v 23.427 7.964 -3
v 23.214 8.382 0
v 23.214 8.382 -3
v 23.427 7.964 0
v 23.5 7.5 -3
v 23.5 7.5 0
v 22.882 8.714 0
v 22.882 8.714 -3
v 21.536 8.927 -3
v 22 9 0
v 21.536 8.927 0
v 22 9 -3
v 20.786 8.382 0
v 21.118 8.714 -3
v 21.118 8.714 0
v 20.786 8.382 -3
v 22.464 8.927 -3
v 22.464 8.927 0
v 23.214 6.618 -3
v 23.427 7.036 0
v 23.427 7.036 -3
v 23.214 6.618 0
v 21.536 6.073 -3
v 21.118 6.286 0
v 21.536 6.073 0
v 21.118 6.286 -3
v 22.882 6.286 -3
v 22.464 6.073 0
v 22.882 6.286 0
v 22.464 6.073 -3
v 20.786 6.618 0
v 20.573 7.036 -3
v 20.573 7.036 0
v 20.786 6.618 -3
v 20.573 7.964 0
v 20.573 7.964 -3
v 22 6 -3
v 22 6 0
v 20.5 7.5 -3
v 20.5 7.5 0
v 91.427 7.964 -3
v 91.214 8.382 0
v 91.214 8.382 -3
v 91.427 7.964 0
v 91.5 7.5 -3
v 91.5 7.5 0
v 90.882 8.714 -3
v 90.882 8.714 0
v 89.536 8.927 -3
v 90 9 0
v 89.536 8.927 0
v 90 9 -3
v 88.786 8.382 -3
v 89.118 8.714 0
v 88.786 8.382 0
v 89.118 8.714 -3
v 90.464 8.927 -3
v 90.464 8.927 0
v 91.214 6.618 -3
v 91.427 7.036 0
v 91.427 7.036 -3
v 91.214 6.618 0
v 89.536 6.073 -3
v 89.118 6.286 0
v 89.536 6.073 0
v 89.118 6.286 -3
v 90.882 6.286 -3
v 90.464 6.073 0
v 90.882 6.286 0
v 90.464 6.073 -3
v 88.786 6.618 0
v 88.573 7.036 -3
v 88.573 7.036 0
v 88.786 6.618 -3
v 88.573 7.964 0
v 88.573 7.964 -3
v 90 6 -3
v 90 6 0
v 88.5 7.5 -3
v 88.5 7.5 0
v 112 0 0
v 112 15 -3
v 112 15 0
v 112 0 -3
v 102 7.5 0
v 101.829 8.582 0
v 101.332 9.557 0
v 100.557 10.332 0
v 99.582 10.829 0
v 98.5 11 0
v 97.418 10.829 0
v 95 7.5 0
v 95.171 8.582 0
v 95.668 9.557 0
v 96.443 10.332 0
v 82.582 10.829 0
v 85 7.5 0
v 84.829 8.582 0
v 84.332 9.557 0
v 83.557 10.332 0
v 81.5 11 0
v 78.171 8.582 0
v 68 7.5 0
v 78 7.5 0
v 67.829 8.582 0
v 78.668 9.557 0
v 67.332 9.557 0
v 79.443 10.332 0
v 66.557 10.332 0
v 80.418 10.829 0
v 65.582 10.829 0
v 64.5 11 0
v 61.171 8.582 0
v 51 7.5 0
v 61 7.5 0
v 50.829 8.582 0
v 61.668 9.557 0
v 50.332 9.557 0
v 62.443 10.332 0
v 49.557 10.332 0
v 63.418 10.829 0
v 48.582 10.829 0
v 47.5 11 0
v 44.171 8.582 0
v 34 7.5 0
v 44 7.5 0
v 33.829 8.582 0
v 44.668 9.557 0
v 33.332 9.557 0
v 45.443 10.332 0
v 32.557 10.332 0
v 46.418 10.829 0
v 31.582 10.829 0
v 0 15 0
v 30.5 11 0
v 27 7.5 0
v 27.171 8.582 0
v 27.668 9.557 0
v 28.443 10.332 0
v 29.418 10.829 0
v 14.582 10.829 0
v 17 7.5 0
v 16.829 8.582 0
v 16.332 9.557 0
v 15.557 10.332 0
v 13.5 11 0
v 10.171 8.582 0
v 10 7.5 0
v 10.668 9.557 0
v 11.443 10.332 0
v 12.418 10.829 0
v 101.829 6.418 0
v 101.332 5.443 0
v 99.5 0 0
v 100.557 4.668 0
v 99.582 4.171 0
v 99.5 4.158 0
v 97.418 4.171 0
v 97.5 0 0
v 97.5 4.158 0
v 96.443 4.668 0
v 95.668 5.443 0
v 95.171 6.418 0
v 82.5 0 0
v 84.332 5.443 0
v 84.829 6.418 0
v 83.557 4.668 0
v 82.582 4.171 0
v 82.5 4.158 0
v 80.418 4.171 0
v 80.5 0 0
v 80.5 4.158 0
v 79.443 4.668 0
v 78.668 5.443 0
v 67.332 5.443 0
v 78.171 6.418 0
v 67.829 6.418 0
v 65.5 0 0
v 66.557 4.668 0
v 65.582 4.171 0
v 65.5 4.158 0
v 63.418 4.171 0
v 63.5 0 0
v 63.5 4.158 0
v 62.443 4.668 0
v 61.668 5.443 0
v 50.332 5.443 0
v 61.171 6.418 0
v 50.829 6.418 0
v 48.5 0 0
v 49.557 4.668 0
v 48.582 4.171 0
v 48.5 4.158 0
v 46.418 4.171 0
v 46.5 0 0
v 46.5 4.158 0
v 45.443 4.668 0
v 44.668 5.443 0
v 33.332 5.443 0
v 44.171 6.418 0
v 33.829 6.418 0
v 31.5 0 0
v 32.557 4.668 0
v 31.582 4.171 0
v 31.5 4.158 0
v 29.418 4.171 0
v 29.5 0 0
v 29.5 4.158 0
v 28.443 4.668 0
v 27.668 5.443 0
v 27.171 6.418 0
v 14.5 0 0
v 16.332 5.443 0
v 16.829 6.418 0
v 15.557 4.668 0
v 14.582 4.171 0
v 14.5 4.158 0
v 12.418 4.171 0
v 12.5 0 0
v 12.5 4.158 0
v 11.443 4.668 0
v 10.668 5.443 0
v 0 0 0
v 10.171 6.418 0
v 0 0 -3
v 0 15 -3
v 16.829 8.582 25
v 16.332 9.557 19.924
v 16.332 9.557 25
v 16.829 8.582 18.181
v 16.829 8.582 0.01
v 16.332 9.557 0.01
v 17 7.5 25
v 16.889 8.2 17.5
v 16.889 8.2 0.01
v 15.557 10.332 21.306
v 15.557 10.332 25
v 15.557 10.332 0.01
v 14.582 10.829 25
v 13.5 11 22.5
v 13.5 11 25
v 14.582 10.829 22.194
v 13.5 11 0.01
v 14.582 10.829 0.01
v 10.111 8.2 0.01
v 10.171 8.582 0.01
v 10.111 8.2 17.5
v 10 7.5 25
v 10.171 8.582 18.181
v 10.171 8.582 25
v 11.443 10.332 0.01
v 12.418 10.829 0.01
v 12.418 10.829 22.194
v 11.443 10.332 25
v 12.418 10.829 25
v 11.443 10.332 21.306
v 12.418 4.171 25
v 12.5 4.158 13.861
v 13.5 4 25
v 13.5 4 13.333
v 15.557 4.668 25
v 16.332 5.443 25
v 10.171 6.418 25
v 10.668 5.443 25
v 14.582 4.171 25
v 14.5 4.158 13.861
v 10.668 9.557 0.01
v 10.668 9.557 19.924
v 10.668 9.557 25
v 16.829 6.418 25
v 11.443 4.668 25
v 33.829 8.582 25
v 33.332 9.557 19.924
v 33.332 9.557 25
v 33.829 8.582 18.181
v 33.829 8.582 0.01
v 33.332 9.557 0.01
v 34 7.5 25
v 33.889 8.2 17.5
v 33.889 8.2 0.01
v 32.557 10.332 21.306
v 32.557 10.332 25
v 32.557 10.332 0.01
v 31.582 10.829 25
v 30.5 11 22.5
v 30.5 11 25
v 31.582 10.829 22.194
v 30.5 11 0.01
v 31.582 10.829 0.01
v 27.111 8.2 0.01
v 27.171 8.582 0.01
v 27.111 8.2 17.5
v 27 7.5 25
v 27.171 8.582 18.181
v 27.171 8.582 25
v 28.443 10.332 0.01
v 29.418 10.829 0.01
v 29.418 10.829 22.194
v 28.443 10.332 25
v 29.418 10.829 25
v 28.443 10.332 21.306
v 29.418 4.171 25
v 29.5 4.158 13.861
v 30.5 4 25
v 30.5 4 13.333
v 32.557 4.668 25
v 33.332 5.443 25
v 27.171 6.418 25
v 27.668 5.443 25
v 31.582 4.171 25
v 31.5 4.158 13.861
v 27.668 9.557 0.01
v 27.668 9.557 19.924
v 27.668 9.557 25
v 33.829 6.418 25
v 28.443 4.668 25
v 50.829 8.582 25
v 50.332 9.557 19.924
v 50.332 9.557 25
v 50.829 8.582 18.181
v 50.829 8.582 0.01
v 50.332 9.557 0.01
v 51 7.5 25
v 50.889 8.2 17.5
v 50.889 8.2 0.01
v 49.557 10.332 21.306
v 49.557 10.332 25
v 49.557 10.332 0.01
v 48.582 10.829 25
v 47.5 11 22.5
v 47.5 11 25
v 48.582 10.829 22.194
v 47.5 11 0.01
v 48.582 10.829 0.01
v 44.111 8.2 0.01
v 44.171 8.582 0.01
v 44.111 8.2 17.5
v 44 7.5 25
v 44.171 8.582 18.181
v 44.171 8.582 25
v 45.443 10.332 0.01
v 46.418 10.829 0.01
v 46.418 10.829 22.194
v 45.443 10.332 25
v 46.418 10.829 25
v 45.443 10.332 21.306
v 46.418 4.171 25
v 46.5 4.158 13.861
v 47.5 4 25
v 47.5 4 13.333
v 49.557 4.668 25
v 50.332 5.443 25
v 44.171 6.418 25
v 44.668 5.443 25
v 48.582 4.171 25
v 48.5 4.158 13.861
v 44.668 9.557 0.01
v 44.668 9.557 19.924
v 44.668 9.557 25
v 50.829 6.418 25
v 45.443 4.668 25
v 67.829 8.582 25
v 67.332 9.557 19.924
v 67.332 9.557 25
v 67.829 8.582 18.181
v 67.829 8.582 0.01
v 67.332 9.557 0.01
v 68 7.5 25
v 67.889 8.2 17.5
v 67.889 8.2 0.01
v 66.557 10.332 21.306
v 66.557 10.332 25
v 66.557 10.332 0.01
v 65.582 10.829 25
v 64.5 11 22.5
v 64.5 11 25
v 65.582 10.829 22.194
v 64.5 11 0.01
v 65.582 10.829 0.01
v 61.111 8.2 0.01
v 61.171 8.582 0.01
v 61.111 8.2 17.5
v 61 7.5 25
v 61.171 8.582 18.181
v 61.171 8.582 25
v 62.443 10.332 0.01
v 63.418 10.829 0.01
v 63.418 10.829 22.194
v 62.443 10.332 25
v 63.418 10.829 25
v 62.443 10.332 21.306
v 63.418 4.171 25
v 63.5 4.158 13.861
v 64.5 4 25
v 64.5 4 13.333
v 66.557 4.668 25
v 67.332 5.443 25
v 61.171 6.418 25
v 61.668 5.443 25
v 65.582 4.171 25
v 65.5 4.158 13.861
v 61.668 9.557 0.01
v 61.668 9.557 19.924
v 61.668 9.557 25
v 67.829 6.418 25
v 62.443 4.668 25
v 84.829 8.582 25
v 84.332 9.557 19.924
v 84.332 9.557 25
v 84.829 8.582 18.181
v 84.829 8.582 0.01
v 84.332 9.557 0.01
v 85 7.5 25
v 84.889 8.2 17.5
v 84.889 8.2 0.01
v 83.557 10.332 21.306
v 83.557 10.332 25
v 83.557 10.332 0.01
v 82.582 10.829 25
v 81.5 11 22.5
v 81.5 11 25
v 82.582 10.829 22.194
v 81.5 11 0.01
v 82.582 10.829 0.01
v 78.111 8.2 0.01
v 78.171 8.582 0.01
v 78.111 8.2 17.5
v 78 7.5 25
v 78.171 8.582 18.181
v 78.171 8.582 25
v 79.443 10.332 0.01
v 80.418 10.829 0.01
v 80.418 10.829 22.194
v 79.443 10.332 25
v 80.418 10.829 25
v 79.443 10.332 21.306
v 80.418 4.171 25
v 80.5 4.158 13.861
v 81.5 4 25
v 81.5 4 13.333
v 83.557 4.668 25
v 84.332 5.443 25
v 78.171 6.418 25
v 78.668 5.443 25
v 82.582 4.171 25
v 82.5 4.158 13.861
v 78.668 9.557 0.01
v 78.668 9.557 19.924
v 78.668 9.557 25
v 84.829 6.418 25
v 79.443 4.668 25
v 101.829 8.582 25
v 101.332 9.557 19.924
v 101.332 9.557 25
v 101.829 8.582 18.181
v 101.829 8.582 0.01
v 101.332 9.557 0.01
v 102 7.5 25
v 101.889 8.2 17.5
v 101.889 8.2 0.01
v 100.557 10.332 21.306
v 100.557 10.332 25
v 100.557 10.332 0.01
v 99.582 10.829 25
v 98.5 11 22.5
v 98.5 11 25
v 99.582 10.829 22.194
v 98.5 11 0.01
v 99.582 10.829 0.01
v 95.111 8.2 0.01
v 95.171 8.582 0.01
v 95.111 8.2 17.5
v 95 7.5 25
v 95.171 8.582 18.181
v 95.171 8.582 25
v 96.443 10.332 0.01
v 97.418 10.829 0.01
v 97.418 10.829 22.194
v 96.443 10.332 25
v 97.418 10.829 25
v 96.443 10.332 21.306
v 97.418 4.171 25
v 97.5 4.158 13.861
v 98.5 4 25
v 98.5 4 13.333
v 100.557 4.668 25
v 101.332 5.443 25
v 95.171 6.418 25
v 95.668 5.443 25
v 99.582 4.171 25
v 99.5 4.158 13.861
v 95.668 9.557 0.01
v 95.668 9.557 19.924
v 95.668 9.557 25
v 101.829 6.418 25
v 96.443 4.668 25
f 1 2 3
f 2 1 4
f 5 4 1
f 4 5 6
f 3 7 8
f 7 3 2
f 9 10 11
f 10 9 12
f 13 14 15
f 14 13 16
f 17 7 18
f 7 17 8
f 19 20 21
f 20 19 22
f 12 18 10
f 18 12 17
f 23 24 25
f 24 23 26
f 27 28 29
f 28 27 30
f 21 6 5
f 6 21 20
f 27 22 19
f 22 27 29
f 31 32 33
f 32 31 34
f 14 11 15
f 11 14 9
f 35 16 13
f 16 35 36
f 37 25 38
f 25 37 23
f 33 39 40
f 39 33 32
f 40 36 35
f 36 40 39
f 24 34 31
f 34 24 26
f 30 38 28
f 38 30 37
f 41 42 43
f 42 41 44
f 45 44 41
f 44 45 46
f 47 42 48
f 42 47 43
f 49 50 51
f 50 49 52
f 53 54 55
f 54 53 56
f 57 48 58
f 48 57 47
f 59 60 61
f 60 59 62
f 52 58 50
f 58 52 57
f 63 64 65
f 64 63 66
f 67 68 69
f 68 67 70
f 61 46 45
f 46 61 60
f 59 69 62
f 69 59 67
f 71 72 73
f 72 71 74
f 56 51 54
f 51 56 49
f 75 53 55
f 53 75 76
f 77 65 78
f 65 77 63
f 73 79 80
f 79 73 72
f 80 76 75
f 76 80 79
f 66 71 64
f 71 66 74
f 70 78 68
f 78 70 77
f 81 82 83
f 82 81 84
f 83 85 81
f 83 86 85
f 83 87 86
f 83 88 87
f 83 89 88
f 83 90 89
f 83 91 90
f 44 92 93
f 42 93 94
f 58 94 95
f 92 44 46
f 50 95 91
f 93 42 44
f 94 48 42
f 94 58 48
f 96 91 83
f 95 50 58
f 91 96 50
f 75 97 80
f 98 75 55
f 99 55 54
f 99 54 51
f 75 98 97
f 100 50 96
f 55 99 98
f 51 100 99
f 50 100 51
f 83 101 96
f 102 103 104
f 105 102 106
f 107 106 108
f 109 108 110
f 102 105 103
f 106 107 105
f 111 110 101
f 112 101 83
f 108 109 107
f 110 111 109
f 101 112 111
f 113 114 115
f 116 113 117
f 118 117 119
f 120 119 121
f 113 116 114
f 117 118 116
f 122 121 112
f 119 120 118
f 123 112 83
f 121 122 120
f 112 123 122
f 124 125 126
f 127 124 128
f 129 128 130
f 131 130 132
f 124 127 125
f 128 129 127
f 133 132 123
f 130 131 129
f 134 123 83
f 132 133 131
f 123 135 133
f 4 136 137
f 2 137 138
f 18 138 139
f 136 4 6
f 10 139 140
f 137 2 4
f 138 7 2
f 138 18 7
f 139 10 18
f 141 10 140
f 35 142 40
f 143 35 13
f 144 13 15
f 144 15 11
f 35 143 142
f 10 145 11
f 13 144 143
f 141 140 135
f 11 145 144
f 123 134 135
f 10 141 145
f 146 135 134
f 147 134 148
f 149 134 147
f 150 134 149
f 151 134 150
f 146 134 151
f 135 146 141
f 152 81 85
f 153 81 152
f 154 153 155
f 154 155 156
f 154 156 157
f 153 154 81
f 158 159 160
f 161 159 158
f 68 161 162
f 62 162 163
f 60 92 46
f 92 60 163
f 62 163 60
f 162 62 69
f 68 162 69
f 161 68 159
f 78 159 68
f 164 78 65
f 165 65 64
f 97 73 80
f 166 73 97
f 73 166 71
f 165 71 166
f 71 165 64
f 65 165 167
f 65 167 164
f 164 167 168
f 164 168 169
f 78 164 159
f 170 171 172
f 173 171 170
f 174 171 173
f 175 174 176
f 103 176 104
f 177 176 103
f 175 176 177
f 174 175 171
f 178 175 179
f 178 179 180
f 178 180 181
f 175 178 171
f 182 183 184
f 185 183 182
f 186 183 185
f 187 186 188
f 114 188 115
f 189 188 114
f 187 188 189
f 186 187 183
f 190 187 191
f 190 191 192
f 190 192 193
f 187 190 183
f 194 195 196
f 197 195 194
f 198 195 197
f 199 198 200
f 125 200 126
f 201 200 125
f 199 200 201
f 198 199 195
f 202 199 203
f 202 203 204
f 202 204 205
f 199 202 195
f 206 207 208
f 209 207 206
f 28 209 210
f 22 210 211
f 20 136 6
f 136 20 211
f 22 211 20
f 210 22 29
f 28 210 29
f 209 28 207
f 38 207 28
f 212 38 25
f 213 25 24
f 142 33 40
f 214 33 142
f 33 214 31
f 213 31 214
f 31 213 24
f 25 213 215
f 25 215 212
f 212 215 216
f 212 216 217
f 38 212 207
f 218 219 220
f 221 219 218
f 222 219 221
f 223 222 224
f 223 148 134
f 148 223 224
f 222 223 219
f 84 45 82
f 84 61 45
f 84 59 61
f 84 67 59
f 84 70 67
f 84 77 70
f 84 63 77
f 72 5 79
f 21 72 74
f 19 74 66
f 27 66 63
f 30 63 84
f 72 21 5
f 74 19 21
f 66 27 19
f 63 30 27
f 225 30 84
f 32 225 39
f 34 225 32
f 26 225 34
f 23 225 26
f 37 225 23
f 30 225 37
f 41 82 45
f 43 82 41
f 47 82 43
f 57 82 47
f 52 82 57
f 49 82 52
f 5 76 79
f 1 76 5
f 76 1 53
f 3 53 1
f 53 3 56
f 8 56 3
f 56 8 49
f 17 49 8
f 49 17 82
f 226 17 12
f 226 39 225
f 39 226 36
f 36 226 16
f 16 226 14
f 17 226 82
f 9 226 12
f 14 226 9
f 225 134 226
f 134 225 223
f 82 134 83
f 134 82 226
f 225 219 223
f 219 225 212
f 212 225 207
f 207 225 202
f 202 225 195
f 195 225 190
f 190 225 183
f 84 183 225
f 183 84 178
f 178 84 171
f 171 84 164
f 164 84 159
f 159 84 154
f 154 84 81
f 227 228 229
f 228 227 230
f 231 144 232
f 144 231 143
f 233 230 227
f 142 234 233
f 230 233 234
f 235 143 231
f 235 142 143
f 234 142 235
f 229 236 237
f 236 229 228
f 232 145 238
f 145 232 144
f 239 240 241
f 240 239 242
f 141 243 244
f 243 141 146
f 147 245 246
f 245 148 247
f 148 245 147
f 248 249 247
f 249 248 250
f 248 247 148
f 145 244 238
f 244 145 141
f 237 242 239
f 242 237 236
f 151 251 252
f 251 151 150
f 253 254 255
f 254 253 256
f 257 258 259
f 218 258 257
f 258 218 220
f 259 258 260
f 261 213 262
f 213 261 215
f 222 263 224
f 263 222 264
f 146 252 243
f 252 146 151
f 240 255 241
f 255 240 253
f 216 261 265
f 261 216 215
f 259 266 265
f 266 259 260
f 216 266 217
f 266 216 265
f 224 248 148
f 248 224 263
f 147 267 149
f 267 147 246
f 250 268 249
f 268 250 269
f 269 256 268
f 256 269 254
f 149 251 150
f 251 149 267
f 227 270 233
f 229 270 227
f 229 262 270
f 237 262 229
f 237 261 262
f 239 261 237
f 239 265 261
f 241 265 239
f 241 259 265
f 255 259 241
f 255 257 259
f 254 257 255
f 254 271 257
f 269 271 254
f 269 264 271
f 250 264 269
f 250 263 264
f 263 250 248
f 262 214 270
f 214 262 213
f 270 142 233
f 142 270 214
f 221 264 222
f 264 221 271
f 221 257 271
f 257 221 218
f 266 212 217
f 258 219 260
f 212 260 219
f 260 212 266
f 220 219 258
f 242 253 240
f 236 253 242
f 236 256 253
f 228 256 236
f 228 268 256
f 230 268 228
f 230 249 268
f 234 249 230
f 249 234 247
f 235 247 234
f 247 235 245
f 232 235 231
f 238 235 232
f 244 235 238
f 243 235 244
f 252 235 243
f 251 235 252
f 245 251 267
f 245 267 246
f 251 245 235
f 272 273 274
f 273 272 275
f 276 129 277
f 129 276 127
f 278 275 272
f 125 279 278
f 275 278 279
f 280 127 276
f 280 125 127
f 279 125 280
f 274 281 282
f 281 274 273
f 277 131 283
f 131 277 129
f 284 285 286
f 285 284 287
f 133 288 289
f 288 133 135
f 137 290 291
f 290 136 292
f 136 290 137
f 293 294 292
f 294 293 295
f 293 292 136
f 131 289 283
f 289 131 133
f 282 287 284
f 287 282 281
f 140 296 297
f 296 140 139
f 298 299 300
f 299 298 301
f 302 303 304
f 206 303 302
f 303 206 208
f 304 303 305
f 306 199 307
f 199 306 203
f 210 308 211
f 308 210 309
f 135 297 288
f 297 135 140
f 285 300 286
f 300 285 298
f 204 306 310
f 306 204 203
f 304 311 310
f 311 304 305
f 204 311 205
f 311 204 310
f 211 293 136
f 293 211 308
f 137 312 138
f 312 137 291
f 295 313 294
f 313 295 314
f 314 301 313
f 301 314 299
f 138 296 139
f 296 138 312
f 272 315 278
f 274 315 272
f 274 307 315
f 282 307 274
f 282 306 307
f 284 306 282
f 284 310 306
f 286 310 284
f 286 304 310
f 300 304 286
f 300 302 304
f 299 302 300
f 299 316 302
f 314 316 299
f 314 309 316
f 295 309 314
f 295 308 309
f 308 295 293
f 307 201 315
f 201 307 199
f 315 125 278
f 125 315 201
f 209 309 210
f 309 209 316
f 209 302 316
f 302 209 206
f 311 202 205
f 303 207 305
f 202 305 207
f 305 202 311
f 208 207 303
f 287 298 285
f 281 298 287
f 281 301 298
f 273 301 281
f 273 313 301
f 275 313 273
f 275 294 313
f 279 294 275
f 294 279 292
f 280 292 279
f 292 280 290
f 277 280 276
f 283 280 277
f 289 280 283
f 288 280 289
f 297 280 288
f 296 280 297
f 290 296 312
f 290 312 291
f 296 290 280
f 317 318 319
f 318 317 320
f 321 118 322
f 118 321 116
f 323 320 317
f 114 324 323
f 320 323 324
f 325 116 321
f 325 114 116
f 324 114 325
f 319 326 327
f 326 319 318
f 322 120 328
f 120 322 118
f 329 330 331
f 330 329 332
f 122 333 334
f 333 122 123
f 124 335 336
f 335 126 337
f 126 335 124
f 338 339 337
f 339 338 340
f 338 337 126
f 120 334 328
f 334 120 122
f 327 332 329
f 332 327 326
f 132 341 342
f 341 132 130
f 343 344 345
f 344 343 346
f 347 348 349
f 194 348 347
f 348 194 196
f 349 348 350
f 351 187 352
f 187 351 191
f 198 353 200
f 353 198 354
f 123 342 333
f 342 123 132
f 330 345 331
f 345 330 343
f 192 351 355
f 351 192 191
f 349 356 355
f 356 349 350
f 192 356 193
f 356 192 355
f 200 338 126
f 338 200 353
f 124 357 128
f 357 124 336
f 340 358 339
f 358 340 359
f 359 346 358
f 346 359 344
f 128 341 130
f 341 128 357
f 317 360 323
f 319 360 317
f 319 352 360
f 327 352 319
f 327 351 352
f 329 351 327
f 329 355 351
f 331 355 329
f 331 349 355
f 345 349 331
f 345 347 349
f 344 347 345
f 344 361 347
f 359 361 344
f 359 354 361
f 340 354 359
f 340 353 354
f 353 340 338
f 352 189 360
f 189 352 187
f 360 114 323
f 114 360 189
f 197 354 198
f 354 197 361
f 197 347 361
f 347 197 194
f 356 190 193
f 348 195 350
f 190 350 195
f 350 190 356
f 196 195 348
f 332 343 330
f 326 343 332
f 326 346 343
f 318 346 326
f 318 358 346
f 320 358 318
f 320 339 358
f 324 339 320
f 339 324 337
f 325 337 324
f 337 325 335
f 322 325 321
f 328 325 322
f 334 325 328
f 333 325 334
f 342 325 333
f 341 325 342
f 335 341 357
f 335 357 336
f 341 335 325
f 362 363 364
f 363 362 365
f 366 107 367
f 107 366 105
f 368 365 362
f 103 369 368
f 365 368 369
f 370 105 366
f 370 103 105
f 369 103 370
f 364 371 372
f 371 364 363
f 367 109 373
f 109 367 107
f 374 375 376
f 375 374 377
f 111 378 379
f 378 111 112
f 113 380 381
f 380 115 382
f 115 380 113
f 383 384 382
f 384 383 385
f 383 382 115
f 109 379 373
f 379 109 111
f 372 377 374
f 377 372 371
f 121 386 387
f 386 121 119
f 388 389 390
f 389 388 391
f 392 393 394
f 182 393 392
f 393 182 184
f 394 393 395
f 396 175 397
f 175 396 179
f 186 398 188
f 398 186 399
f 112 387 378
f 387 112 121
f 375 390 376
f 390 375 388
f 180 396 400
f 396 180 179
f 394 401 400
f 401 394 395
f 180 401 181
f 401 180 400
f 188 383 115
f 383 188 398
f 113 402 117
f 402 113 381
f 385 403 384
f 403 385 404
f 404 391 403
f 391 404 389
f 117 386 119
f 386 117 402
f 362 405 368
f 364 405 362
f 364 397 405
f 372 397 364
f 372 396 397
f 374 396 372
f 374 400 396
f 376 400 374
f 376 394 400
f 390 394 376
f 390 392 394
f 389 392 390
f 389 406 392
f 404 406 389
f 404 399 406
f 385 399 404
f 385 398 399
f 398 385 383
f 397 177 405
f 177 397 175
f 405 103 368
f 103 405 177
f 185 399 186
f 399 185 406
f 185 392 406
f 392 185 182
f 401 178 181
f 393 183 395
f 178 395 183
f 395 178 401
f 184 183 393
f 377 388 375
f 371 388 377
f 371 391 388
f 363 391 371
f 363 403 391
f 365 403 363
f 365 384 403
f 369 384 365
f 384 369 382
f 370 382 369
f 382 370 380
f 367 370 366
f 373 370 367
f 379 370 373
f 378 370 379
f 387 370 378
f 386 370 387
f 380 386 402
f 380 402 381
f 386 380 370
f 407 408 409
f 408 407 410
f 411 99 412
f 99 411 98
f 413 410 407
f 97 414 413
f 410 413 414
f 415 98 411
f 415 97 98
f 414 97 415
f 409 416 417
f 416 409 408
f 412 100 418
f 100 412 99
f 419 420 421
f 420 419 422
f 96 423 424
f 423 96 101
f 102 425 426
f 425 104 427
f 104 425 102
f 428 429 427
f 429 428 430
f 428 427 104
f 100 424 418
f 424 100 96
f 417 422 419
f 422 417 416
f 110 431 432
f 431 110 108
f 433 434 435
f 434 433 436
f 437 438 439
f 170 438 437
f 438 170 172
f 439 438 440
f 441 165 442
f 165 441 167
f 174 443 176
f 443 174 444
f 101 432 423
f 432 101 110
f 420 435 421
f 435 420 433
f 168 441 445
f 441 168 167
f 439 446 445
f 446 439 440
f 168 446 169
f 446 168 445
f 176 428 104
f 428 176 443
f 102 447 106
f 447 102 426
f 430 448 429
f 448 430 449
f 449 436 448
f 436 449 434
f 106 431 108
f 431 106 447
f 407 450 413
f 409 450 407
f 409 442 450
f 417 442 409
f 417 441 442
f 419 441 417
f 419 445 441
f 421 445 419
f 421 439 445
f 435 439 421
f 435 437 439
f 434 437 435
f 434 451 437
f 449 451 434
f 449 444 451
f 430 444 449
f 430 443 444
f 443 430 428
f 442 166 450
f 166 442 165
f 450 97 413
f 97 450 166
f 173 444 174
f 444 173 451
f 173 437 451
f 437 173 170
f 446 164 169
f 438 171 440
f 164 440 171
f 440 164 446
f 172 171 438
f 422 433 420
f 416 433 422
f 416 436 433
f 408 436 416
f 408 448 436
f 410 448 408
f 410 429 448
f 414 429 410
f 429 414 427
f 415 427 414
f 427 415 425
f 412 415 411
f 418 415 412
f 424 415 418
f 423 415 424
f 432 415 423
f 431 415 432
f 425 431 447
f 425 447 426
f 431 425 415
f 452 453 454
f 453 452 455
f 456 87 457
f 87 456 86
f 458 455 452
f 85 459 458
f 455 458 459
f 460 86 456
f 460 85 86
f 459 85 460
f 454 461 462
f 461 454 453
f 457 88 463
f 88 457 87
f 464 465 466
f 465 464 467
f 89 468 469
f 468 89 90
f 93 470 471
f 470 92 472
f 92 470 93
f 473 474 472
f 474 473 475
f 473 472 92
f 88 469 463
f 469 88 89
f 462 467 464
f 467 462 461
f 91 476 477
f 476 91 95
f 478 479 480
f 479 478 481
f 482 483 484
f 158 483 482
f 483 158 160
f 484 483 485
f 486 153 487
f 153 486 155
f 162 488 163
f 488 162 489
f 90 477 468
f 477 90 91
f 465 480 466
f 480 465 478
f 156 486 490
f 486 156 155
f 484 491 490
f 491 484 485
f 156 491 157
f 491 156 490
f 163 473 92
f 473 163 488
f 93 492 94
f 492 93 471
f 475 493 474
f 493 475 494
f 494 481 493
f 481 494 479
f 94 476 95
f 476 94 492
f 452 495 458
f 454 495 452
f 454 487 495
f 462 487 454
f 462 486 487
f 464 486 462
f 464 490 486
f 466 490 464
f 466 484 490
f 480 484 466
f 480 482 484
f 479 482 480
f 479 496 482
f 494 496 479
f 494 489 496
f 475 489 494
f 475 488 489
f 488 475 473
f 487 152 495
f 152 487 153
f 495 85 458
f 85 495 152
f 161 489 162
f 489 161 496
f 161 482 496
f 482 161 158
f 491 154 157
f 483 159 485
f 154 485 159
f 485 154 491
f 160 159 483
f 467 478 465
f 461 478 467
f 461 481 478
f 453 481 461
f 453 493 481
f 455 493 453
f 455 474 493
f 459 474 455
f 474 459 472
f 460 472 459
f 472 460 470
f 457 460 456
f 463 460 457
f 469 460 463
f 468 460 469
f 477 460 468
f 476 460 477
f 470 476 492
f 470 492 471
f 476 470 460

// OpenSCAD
$fn=20*1; // circle accuracy

E = 0.01*1; // small value used to avoid dumb roundings

/* [General] */

// Number of hooks
num_hooks = 6; // [2:30]

// Diameter of each hook peg (mm)
hook_dia = 7; // [2:30]

// margin around hooks in left-right dimension (mm)
x_margin = 10; // [2:20]

// margin around hooks in up-down dimension (mm)
y_margin = 4; // [2:20]

// length of each hook peg from base (mm)
hook_length=25; // [4:50]

// How thick is the base plate? (mm)
base_thickness = 3; // [1:10]

// What is the diameter of the two mounting holes (zero to disable)? (mm)
hole_dia = 3; // [0:15]

/* [Hook details] */

// how deep is the gap in the peg (zero for no gap)? (%)
gap_depth_percentage = 40; // [0:90]

// how far down onto the peg does the gap start? Must be greater than gap percentage B. (%)
gap_percentage_a = 90; // [70:100]

// how far down onto the peg does the gap end? Must be less than gap percentage A. (%)
gap_percentage_b = 70; // [0:70]

gap_a = gap_percentage_a/100 * hook_length;
gap_b = gap_percentage_b/100 * hook_length;
gap_depth = hook_dia*(0.5-gap_depth_percentage/100);

// How wide is the bottom triangluar support (zero for none)? (mm)
support_width=2;

total_width = (x_margin+hook_dia)*num_hooks+x_margin;
total_height = y_margin+hook_dia+y_margin;

translate([0,0,-base_thickness]) difference() {
    cube([total_width,total_height,base_thickness]);
    for (i = [0,num_hooks-2]) {
        x = x_margin*1.5 + hook_dia + i*(x_margin+hook_dia);
        y = y_margin + hook_dia/2;

        translate([x,y,-E]) cylinder(d=hole_dia, h=base_thickness*1.5);
    }
}

for (i = [0:num_hooks-1]) {
    x = x_margin + hook_dia/2 + i*(x_margin+hook_dia);
    y = y_margin + hook_dia/2;
    translate([x,y,0]) difference() {
        union() {
            cylinder(d=hook_dia,h=hook_length);
            rotate([0,-90,0]) translate([0,0,-support_width/2]) linear_extrude(support_width) polygon([
                [0,0],
                [hook_length,0],
                [0,-(y_margin+hook_dia/2)]
            ]);
        }
        rotate([0,-90,0]) translate([0,0,-hook_dia/2-0.5]) linear_extrude(hook_dia+1) polygon([
            [E,gap_depth],
            [E,hook_dia],
            [gap_a,hook_dia],
            [gap_a,hook_dia/2],
            [gap_b,gap_depth]
        ]);
    }
}
